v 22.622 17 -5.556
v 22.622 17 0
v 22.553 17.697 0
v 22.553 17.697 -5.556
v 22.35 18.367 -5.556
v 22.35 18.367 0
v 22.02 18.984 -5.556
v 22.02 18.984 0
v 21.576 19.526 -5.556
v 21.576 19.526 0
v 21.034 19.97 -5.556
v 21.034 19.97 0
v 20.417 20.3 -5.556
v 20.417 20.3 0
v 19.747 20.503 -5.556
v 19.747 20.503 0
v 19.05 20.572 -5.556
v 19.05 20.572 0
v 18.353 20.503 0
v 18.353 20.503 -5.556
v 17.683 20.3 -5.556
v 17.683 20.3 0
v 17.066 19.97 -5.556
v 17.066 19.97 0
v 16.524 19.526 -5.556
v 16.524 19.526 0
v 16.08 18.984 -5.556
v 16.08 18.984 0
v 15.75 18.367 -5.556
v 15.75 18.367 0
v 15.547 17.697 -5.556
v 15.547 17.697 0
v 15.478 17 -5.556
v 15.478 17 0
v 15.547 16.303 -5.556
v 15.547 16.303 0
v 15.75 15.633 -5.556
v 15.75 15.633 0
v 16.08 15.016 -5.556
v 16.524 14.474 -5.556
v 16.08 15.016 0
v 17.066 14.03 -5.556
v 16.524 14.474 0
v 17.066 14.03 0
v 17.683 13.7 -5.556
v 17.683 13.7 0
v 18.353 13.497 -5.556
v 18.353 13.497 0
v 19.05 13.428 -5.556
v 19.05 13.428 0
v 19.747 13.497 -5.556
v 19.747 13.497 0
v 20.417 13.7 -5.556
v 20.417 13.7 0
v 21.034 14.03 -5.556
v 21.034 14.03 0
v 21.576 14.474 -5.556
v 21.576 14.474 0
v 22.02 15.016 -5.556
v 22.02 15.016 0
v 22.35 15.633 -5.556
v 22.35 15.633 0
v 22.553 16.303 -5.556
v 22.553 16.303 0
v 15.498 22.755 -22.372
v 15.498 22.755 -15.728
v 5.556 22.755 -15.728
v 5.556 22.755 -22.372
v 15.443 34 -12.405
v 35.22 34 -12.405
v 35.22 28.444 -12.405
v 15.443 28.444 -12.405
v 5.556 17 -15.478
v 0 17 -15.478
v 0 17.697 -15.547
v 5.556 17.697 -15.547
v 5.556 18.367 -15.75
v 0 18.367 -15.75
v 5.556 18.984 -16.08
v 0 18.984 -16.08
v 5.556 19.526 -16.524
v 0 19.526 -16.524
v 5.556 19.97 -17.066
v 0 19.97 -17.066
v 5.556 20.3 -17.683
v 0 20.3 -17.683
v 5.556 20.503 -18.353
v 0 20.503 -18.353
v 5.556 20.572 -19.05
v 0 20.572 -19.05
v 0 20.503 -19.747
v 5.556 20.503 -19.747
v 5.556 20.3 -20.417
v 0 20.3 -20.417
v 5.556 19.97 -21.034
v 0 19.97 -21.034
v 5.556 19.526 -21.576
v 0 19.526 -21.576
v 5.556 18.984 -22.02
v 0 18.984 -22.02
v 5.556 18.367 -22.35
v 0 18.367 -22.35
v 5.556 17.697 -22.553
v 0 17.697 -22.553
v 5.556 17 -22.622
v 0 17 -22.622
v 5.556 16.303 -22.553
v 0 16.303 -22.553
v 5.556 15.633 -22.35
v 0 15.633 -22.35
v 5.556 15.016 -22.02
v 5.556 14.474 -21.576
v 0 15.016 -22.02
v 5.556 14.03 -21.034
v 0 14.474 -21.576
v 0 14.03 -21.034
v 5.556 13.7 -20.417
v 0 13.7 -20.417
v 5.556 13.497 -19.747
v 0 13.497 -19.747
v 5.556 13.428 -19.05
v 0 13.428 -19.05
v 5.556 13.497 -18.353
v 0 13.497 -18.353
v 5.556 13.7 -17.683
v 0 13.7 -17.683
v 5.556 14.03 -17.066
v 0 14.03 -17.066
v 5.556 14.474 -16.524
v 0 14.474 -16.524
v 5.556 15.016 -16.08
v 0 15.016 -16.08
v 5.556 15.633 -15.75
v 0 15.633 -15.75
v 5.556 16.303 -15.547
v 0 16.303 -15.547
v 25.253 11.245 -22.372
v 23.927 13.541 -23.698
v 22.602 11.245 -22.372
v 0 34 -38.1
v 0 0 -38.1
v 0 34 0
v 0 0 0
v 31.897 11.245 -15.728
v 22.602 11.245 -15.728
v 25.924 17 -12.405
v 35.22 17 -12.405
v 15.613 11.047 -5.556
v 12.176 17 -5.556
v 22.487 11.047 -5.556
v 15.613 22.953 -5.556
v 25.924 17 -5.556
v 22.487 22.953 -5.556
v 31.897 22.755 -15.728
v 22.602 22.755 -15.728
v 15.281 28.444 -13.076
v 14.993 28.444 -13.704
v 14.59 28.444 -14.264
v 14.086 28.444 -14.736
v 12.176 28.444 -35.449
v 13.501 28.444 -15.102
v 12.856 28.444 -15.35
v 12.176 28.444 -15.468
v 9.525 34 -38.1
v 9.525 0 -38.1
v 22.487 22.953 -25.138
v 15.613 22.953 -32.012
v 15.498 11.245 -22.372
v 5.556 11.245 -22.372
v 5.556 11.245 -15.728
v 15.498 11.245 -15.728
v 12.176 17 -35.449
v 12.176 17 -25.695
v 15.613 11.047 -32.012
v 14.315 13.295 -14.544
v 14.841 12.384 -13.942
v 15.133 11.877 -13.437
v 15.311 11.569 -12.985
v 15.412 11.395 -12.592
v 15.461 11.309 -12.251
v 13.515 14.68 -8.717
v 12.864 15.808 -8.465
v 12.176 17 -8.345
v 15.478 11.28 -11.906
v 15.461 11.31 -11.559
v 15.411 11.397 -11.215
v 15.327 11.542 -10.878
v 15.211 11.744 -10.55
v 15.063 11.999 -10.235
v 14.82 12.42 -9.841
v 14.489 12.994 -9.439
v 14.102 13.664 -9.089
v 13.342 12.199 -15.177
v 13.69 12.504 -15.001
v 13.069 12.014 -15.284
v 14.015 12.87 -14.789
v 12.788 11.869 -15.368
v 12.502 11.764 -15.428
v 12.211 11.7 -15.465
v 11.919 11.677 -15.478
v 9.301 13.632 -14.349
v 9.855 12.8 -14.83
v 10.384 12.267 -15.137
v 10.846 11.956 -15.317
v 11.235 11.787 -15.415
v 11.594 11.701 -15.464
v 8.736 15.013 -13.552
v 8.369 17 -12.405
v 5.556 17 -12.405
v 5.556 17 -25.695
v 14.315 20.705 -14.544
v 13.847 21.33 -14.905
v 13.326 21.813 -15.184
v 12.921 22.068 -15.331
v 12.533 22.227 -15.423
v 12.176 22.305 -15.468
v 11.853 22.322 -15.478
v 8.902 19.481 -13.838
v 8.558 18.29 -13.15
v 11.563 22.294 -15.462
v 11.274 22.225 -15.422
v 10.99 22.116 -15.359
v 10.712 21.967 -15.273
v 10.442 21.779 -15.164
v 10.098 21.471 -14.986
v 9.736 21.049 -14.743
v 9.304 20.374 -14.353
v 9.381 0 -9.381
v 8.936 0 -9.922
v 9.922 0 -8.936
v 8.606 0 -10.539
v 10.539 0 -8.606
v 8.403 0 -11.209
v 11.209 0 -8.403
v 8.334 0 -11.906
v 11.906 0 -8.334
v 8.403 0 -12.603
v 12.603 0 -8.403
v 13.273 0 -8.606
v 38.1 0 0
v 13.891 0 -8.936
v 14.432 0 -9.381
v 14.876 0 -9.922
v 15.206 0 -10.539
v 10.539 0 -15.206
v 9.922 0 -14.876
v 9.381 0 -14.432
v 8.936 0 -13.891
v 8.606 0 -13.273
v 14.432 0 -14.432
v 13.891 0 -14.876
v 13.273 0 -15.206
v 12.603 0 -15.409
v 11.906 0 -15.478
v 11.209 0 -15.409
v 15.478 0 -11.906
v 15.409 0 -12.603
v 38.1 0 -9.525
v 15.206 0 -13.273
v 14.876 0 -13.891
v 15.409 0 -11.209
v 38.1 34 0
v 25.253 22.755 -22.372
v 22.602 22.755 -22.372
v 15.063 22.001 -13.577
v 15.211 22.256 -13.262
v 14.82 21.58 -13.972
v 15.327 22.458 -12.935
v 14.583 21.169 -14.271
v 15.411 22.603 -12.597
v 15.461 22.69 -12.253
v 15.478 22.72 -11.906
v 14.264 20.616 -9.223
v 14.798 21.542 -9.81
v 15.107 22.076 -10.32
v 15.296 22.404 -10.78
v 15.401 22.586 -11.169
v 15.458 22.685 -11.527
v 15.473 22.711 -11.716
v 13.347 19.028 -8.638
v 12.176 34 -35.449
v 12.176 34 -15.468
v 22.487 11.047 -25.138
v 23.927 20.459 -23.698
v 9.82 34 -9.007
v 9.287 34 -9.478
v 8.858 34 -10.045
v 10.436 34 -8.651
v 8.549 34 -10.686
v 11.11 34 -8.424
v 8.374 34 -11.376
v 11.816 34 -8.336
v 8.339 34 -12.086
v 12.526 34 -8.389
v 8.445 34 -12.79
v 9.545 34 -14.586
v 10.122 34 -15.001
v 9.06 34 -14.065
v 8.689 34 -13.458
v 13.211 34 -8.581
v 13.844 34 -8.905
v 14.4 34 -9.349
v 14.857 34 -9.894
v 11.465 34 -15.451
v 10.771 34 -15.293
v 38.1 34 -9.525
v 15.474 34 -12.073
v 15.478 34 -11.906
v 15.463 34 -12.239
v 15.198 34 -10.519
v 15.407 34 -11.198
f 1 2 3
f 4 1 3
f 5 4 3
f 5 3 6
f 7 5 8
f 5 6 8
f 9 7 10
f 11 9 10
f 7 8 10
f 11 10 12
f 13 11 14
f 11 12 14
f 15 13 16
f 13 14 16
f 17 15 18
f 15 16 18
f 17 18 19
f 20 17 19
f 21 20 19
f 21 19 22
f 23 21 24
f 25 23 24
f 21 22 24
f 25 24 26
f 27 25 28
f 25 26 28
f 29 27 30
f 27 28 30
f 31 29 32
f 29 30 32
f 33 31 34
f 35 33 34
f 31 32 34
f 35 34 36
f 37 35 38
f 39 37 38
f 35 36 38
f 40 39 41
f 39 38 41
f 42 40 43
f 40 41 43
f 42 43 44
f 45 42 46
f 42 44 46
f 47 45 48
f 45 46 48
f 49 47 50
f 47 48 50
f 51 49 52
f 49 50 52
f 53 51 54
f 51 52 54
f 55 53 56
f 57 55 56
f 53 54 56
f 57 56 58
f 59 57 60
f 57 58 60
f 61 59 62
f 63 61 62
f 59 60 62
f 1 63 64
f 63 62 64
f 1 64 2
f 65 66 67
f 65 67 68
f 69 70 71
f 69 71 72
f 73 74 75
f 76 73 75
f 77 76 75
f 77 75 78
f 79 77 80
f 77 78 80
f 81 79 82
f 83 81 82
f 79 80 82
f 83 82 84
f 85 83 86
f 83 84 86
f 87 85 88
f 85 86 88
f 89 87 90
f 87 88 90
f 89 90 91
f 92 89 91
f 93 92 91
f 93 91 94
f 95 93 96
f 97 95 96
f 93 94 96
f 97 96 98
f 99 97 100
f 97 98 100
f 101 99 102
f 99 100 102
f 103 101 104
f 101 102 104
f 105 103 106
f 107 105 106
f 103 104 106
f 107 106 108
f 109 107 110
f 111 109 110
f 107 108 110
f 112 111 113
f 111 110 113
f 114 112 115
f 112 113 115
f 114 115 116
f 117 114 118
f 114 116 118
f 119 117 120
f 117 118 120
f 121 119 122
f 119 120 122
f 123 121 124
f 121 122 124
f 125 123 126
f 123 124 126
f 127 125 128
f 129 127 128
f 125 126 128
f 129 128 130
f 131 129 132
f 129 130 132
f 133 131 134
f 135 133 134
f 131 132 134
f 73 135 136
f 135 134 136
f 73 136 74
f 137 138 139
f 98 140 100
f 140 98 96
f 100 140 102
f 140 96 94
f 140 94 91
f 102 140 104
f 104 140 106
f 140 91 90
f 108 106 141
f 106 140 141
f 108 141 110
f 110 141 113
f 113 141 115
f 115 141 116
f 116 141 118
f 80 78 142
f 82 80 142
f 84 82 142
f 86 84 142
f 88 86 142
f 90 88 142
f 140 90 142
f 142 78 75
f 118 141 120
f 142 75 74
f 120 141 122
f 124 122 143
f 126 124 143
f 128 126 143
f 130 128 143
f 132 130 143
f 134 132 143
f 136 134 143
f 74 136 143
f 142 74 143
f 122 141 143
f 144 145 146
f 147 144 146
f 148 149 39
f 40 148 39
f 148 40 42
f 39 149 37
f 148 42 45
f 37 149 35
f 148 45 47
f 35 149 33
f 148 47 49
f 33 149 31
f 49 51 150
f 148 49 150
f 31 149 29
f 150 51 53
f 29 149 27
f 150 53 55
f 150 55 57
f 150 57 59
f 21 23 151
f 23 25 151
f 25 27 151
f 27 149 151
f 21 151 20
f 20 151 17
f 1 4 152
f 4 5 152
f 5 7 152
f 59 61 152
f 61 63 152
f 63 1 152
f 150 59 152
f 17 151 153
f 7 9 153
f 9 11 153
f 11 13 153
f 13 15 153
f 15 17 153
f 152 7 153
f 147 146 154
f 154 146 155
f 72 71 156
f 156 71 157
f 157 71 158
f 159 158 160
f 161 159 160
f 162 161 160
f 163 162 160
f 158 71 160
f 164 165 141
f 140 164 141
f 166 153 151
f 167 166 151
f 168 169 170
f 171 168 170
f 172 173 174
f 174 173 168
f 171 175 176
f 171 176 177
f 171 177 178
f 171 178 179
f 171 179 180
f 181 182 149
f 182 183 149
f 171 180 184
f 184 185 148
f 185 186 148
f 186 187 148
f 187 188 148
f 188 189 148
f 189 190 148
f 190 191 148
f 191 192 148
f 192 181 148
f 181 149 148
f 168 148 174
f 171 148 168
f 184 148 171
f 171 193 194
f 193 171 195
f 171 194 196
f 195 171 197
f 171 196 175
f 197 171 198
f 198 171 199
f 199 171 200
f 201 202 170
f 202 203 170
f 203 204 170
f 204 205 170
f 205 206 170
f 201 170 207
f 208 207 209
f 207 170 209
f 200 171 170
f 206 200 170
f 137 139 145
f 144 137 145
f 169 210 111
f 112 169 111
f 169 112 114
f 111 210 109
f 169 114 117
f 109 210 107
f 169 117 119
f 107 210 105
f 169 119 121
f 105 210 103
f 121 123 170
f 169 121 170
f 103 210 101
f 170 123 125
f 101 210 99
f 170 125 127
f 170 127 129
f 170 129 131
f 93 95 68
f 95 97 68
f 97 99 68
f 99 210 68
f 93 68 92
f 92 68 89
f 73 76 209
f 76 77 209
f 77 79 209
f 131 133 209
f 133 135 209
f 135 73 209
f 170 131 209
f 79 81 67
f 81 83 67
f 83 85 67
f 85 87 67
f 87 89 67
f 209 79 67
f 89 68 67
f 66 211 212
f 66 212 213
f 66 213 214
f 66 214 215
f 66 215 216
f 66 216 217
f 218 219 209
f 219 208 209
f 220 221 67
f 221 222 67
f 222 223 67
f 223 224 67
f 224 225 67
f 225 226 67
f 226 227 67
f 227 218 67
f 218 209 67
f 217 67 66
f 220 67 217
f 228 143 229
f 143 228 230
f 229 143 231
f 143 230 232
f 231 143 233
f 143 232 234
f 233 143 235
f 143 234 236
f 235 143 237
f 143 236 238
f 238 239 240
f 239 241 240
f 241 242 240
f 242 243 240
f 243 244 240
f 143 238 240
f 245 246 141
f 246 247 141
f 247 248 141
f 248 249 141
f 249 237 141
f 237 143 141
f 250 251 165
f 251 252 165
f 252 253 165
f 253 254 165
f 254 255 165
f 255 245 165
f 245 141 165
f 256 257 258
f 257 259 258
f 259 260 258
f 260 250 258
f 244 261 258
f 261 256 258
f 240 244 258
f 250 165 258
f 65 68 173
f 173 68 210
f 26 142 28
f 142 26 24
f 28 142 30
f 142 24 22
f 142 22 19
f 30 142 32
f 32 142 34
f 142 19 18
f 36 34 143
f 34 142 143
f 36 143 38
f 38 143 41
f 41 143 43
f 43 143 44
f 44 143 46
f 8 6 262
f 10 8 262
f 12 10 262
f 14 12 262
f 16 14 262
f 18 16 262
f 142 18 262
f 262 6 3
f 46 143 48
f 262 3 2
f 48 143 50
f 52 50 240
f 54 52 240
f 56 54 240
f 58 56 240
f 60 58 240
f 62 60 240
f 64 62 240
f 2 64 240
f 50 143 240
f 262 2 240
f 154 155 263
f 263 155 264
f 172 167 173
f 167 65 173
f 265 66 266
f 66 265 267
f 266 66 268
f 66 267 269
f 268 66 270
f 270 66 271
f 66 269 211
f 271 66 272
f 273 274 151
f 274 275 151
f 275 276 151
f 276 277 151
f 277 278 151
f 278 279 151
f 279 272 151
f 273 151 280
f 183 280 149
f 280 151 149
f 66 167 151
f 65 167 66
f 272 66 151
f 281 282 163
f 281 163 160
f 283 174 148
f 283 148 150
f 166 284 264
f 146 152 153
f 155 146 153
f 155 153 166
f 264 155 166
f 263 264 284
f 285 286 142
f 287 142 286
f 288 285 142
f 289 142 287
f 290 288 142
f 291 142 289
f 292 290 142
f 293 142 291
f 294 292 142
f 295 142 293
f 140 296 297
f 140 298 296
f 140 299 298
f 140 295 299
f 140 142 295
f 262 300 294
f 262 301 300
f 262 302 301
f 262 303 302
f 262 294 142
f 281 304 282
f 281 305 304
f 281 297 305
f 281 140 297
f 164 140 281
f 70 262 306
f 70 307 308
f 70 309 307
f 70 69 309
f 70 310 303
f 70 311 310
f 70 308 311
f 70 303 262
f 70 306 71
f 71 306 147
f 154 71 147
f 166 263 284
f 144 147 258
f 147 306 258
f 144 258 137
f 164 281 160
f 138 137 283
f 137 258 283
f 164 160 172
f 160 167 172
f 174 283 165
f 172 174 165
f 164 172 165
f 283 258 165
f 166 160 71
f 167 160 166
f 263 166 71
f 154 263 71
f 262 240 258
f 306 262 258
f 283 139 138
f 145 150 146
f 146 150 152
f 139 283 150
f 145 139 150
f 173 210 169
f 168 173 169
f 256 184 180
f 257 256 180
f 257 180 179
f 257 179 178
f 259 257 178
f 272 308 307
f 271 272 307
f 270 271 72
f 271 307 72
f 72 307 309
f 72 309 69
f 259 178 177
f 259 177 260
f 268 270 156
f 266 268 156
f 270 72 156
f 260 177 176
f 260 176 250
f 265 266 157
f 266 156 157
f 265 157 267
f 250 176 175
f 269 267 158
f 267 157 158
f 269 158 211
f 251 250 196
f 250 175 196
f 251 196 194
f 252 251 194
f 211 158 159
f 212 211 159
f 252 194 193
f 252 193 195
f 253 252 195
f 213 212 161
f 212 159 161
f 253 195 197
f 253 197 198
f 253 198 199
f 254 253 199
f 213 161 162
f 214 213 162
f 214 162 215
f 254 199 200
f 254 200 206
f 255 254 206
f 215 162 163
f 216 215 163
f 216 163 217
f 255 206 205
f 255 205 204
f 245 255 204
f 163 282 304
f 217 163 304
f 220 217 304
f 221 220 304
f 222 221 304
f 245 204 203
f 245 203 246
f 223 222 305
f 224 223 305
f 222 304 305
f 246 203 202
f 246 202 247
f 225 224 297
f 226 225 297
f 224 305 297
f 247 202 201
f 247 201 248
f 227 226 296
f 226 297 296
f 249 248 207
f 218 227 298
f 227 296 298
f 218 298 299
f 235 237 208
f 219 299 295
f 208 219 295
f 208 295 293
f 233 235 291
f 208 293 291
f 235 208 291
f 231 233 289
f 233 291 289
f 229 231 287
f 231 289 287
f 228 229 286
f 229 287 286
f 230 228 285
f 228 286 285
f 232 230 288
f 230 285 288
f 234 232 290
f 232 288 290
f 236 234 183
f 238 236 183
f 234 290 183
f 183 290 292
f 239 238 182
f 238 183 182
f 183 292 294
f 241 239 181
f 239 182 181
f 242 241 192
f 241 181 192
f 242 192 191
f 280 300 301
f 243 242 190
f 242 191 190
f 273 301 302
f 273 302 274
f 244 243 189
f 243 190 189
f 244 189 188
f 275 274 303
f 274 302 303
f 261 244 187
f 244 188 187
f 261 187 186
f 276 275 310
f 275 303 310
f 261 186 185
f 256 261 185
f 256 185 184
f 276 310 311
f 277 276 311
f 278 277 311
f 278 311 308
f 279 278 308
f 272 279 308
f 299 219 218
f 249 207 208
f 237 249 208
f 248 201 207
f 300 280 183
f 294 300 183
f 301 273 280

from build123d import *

# Parameters (mm, degrees)
MAIN_BODY_DEPTH              = 34
SKETCH3_R                    = 3.571875
F_9_32_RIGHT_RAIL_DEPTH      = 1
F_9_32_RIGHT_RAIL_DEPTH_BACK = 5.55625
SKETCH4_R                    = 3.571875
F_9_32_LEFT_RAIL_DEPTH       = 5.55625
SKETCH8_R                    = 3.571875
F_9_32_TOPPER_DEPTH          = 1
F_9_32_TOPPER_DEPTH_BACK     = 35
CUT_EXTRUDE3_START           = -5.55625
CUT_EXTRUDE3_DEPTH           = 32.54375
CUT_EXTRUDE4_START           = -5.55625
CUT_EXTRUDE4_DEPTH           = 32.54375
CUT_EXTRUDE6_DEPTH           = 5.55625


with BuildPart() as part:
    # Sketch1 → Main Body (new body)
    with BuildSketch(Plane(origin=(0, 0, 0), x_dir=(1, 0, 0), z_dir=(0, 1, 0))):
        Polygon((0, 0), (38.1, 0), (38.1, 9.525), (9.525, 38.1), (0, 38.1), align=None)
    extrude(amount=MAIN_BODY_DEPTH)

    # Sketch3 → 9/32 Right Rail (cut, two sides)
    with BuildSketch(Plane.XY) as f_9_32_right_rail_sk:
        with Locations((19.05, 17)):
            Circle(SKETCH3_R)
    extrude(amount=F_9_32_RIGHT_RAIL_DEPTH, mode=Mode.SUBTRACT)
    extrude(f_9_32_right_rail_sk.sketch, amount=-F_9_32_RIGHT_RAIL_DEPTH_BACK, mode=Mode.SUBTRACT)

    # Sketch4 → 9/32 Left Rail (cut)
    with BuildSketch(Plane.ZY):
        with Locations((-19.05, 17)):
            Circle(SKETCH4_R)
    extrude(amount=-F_9_32_LEFT_RAIL_DEPTH, mode=Mode.SUBTRACT)

    # Sketch8 → 9/32 Topper (cut, two sides)
    with BuildSketch(Plane(origin=(0, 34, 0), x_dir=(1, 0, 0), z_dir=(0, 1, 0))) as f_9_32_topper_sk:
        with Locations((11.90625, 11.90625)):
            Circle(SKETCH8_R)
    extrude(amount=F_9_32_TOPPER_DEPTH, mode=Mode.SUBTRACT)
    extrude(f_9_32_topper_sk.sketch, amount=-F_9_32_TOPPER_DEPTH_BACK, mode=Mode.SUBTRACT)

    # Sketch9 → Cut-Extrude3 (cut)
    with BuildSketch(Plane.ZY.offset(CUT_EXTRUDE3_START)):
        Polygon((-22.372470377, 22.7546875), (-25.694940754, 17), (-22.372470377, 11.2453125), (-15.727529623, 11.2453125), (-12.405059246, 17), (-15.727529623, 22.7546875), align=None)
    extrude(amount=-CUT_EXTRUDE3_DEPTH, mode=Mode.SUBTRACT)

    # Sketch10 → Cut-Extrude4 (cut)
    with BuildSketch(Plane.XY.offset(CUT_EXTRUDE4_START)):
        Polygon((15.612961679, 22.953125), (12.175923357, 17), (15.612961679, 11.046875), (22.487038321, 11.046875), (25.924076643, 17), (22.487038321, 22.953125), align=None)
    extrude(amount=-CUT_EXTRUDE4_DEPTH, mode=Mode.SUBTRACT)

    # Sketch13 → Cut-Extrude6 (cut)
    with BuildSketch(Plane(origin=(0, 34, 0), x_dir=(1, 0, 0), z_dir=(0, 1, 0))):
        Polygon((35.219940754, 12.405059246), (12.175923357, 12.405059246), (12.175923357, 35.449076643), align=None)
    extrude(amount=-CUT_EXTRUDE6_DEPTH, mode=Mode.SUBTRACT)


solid = part.part
